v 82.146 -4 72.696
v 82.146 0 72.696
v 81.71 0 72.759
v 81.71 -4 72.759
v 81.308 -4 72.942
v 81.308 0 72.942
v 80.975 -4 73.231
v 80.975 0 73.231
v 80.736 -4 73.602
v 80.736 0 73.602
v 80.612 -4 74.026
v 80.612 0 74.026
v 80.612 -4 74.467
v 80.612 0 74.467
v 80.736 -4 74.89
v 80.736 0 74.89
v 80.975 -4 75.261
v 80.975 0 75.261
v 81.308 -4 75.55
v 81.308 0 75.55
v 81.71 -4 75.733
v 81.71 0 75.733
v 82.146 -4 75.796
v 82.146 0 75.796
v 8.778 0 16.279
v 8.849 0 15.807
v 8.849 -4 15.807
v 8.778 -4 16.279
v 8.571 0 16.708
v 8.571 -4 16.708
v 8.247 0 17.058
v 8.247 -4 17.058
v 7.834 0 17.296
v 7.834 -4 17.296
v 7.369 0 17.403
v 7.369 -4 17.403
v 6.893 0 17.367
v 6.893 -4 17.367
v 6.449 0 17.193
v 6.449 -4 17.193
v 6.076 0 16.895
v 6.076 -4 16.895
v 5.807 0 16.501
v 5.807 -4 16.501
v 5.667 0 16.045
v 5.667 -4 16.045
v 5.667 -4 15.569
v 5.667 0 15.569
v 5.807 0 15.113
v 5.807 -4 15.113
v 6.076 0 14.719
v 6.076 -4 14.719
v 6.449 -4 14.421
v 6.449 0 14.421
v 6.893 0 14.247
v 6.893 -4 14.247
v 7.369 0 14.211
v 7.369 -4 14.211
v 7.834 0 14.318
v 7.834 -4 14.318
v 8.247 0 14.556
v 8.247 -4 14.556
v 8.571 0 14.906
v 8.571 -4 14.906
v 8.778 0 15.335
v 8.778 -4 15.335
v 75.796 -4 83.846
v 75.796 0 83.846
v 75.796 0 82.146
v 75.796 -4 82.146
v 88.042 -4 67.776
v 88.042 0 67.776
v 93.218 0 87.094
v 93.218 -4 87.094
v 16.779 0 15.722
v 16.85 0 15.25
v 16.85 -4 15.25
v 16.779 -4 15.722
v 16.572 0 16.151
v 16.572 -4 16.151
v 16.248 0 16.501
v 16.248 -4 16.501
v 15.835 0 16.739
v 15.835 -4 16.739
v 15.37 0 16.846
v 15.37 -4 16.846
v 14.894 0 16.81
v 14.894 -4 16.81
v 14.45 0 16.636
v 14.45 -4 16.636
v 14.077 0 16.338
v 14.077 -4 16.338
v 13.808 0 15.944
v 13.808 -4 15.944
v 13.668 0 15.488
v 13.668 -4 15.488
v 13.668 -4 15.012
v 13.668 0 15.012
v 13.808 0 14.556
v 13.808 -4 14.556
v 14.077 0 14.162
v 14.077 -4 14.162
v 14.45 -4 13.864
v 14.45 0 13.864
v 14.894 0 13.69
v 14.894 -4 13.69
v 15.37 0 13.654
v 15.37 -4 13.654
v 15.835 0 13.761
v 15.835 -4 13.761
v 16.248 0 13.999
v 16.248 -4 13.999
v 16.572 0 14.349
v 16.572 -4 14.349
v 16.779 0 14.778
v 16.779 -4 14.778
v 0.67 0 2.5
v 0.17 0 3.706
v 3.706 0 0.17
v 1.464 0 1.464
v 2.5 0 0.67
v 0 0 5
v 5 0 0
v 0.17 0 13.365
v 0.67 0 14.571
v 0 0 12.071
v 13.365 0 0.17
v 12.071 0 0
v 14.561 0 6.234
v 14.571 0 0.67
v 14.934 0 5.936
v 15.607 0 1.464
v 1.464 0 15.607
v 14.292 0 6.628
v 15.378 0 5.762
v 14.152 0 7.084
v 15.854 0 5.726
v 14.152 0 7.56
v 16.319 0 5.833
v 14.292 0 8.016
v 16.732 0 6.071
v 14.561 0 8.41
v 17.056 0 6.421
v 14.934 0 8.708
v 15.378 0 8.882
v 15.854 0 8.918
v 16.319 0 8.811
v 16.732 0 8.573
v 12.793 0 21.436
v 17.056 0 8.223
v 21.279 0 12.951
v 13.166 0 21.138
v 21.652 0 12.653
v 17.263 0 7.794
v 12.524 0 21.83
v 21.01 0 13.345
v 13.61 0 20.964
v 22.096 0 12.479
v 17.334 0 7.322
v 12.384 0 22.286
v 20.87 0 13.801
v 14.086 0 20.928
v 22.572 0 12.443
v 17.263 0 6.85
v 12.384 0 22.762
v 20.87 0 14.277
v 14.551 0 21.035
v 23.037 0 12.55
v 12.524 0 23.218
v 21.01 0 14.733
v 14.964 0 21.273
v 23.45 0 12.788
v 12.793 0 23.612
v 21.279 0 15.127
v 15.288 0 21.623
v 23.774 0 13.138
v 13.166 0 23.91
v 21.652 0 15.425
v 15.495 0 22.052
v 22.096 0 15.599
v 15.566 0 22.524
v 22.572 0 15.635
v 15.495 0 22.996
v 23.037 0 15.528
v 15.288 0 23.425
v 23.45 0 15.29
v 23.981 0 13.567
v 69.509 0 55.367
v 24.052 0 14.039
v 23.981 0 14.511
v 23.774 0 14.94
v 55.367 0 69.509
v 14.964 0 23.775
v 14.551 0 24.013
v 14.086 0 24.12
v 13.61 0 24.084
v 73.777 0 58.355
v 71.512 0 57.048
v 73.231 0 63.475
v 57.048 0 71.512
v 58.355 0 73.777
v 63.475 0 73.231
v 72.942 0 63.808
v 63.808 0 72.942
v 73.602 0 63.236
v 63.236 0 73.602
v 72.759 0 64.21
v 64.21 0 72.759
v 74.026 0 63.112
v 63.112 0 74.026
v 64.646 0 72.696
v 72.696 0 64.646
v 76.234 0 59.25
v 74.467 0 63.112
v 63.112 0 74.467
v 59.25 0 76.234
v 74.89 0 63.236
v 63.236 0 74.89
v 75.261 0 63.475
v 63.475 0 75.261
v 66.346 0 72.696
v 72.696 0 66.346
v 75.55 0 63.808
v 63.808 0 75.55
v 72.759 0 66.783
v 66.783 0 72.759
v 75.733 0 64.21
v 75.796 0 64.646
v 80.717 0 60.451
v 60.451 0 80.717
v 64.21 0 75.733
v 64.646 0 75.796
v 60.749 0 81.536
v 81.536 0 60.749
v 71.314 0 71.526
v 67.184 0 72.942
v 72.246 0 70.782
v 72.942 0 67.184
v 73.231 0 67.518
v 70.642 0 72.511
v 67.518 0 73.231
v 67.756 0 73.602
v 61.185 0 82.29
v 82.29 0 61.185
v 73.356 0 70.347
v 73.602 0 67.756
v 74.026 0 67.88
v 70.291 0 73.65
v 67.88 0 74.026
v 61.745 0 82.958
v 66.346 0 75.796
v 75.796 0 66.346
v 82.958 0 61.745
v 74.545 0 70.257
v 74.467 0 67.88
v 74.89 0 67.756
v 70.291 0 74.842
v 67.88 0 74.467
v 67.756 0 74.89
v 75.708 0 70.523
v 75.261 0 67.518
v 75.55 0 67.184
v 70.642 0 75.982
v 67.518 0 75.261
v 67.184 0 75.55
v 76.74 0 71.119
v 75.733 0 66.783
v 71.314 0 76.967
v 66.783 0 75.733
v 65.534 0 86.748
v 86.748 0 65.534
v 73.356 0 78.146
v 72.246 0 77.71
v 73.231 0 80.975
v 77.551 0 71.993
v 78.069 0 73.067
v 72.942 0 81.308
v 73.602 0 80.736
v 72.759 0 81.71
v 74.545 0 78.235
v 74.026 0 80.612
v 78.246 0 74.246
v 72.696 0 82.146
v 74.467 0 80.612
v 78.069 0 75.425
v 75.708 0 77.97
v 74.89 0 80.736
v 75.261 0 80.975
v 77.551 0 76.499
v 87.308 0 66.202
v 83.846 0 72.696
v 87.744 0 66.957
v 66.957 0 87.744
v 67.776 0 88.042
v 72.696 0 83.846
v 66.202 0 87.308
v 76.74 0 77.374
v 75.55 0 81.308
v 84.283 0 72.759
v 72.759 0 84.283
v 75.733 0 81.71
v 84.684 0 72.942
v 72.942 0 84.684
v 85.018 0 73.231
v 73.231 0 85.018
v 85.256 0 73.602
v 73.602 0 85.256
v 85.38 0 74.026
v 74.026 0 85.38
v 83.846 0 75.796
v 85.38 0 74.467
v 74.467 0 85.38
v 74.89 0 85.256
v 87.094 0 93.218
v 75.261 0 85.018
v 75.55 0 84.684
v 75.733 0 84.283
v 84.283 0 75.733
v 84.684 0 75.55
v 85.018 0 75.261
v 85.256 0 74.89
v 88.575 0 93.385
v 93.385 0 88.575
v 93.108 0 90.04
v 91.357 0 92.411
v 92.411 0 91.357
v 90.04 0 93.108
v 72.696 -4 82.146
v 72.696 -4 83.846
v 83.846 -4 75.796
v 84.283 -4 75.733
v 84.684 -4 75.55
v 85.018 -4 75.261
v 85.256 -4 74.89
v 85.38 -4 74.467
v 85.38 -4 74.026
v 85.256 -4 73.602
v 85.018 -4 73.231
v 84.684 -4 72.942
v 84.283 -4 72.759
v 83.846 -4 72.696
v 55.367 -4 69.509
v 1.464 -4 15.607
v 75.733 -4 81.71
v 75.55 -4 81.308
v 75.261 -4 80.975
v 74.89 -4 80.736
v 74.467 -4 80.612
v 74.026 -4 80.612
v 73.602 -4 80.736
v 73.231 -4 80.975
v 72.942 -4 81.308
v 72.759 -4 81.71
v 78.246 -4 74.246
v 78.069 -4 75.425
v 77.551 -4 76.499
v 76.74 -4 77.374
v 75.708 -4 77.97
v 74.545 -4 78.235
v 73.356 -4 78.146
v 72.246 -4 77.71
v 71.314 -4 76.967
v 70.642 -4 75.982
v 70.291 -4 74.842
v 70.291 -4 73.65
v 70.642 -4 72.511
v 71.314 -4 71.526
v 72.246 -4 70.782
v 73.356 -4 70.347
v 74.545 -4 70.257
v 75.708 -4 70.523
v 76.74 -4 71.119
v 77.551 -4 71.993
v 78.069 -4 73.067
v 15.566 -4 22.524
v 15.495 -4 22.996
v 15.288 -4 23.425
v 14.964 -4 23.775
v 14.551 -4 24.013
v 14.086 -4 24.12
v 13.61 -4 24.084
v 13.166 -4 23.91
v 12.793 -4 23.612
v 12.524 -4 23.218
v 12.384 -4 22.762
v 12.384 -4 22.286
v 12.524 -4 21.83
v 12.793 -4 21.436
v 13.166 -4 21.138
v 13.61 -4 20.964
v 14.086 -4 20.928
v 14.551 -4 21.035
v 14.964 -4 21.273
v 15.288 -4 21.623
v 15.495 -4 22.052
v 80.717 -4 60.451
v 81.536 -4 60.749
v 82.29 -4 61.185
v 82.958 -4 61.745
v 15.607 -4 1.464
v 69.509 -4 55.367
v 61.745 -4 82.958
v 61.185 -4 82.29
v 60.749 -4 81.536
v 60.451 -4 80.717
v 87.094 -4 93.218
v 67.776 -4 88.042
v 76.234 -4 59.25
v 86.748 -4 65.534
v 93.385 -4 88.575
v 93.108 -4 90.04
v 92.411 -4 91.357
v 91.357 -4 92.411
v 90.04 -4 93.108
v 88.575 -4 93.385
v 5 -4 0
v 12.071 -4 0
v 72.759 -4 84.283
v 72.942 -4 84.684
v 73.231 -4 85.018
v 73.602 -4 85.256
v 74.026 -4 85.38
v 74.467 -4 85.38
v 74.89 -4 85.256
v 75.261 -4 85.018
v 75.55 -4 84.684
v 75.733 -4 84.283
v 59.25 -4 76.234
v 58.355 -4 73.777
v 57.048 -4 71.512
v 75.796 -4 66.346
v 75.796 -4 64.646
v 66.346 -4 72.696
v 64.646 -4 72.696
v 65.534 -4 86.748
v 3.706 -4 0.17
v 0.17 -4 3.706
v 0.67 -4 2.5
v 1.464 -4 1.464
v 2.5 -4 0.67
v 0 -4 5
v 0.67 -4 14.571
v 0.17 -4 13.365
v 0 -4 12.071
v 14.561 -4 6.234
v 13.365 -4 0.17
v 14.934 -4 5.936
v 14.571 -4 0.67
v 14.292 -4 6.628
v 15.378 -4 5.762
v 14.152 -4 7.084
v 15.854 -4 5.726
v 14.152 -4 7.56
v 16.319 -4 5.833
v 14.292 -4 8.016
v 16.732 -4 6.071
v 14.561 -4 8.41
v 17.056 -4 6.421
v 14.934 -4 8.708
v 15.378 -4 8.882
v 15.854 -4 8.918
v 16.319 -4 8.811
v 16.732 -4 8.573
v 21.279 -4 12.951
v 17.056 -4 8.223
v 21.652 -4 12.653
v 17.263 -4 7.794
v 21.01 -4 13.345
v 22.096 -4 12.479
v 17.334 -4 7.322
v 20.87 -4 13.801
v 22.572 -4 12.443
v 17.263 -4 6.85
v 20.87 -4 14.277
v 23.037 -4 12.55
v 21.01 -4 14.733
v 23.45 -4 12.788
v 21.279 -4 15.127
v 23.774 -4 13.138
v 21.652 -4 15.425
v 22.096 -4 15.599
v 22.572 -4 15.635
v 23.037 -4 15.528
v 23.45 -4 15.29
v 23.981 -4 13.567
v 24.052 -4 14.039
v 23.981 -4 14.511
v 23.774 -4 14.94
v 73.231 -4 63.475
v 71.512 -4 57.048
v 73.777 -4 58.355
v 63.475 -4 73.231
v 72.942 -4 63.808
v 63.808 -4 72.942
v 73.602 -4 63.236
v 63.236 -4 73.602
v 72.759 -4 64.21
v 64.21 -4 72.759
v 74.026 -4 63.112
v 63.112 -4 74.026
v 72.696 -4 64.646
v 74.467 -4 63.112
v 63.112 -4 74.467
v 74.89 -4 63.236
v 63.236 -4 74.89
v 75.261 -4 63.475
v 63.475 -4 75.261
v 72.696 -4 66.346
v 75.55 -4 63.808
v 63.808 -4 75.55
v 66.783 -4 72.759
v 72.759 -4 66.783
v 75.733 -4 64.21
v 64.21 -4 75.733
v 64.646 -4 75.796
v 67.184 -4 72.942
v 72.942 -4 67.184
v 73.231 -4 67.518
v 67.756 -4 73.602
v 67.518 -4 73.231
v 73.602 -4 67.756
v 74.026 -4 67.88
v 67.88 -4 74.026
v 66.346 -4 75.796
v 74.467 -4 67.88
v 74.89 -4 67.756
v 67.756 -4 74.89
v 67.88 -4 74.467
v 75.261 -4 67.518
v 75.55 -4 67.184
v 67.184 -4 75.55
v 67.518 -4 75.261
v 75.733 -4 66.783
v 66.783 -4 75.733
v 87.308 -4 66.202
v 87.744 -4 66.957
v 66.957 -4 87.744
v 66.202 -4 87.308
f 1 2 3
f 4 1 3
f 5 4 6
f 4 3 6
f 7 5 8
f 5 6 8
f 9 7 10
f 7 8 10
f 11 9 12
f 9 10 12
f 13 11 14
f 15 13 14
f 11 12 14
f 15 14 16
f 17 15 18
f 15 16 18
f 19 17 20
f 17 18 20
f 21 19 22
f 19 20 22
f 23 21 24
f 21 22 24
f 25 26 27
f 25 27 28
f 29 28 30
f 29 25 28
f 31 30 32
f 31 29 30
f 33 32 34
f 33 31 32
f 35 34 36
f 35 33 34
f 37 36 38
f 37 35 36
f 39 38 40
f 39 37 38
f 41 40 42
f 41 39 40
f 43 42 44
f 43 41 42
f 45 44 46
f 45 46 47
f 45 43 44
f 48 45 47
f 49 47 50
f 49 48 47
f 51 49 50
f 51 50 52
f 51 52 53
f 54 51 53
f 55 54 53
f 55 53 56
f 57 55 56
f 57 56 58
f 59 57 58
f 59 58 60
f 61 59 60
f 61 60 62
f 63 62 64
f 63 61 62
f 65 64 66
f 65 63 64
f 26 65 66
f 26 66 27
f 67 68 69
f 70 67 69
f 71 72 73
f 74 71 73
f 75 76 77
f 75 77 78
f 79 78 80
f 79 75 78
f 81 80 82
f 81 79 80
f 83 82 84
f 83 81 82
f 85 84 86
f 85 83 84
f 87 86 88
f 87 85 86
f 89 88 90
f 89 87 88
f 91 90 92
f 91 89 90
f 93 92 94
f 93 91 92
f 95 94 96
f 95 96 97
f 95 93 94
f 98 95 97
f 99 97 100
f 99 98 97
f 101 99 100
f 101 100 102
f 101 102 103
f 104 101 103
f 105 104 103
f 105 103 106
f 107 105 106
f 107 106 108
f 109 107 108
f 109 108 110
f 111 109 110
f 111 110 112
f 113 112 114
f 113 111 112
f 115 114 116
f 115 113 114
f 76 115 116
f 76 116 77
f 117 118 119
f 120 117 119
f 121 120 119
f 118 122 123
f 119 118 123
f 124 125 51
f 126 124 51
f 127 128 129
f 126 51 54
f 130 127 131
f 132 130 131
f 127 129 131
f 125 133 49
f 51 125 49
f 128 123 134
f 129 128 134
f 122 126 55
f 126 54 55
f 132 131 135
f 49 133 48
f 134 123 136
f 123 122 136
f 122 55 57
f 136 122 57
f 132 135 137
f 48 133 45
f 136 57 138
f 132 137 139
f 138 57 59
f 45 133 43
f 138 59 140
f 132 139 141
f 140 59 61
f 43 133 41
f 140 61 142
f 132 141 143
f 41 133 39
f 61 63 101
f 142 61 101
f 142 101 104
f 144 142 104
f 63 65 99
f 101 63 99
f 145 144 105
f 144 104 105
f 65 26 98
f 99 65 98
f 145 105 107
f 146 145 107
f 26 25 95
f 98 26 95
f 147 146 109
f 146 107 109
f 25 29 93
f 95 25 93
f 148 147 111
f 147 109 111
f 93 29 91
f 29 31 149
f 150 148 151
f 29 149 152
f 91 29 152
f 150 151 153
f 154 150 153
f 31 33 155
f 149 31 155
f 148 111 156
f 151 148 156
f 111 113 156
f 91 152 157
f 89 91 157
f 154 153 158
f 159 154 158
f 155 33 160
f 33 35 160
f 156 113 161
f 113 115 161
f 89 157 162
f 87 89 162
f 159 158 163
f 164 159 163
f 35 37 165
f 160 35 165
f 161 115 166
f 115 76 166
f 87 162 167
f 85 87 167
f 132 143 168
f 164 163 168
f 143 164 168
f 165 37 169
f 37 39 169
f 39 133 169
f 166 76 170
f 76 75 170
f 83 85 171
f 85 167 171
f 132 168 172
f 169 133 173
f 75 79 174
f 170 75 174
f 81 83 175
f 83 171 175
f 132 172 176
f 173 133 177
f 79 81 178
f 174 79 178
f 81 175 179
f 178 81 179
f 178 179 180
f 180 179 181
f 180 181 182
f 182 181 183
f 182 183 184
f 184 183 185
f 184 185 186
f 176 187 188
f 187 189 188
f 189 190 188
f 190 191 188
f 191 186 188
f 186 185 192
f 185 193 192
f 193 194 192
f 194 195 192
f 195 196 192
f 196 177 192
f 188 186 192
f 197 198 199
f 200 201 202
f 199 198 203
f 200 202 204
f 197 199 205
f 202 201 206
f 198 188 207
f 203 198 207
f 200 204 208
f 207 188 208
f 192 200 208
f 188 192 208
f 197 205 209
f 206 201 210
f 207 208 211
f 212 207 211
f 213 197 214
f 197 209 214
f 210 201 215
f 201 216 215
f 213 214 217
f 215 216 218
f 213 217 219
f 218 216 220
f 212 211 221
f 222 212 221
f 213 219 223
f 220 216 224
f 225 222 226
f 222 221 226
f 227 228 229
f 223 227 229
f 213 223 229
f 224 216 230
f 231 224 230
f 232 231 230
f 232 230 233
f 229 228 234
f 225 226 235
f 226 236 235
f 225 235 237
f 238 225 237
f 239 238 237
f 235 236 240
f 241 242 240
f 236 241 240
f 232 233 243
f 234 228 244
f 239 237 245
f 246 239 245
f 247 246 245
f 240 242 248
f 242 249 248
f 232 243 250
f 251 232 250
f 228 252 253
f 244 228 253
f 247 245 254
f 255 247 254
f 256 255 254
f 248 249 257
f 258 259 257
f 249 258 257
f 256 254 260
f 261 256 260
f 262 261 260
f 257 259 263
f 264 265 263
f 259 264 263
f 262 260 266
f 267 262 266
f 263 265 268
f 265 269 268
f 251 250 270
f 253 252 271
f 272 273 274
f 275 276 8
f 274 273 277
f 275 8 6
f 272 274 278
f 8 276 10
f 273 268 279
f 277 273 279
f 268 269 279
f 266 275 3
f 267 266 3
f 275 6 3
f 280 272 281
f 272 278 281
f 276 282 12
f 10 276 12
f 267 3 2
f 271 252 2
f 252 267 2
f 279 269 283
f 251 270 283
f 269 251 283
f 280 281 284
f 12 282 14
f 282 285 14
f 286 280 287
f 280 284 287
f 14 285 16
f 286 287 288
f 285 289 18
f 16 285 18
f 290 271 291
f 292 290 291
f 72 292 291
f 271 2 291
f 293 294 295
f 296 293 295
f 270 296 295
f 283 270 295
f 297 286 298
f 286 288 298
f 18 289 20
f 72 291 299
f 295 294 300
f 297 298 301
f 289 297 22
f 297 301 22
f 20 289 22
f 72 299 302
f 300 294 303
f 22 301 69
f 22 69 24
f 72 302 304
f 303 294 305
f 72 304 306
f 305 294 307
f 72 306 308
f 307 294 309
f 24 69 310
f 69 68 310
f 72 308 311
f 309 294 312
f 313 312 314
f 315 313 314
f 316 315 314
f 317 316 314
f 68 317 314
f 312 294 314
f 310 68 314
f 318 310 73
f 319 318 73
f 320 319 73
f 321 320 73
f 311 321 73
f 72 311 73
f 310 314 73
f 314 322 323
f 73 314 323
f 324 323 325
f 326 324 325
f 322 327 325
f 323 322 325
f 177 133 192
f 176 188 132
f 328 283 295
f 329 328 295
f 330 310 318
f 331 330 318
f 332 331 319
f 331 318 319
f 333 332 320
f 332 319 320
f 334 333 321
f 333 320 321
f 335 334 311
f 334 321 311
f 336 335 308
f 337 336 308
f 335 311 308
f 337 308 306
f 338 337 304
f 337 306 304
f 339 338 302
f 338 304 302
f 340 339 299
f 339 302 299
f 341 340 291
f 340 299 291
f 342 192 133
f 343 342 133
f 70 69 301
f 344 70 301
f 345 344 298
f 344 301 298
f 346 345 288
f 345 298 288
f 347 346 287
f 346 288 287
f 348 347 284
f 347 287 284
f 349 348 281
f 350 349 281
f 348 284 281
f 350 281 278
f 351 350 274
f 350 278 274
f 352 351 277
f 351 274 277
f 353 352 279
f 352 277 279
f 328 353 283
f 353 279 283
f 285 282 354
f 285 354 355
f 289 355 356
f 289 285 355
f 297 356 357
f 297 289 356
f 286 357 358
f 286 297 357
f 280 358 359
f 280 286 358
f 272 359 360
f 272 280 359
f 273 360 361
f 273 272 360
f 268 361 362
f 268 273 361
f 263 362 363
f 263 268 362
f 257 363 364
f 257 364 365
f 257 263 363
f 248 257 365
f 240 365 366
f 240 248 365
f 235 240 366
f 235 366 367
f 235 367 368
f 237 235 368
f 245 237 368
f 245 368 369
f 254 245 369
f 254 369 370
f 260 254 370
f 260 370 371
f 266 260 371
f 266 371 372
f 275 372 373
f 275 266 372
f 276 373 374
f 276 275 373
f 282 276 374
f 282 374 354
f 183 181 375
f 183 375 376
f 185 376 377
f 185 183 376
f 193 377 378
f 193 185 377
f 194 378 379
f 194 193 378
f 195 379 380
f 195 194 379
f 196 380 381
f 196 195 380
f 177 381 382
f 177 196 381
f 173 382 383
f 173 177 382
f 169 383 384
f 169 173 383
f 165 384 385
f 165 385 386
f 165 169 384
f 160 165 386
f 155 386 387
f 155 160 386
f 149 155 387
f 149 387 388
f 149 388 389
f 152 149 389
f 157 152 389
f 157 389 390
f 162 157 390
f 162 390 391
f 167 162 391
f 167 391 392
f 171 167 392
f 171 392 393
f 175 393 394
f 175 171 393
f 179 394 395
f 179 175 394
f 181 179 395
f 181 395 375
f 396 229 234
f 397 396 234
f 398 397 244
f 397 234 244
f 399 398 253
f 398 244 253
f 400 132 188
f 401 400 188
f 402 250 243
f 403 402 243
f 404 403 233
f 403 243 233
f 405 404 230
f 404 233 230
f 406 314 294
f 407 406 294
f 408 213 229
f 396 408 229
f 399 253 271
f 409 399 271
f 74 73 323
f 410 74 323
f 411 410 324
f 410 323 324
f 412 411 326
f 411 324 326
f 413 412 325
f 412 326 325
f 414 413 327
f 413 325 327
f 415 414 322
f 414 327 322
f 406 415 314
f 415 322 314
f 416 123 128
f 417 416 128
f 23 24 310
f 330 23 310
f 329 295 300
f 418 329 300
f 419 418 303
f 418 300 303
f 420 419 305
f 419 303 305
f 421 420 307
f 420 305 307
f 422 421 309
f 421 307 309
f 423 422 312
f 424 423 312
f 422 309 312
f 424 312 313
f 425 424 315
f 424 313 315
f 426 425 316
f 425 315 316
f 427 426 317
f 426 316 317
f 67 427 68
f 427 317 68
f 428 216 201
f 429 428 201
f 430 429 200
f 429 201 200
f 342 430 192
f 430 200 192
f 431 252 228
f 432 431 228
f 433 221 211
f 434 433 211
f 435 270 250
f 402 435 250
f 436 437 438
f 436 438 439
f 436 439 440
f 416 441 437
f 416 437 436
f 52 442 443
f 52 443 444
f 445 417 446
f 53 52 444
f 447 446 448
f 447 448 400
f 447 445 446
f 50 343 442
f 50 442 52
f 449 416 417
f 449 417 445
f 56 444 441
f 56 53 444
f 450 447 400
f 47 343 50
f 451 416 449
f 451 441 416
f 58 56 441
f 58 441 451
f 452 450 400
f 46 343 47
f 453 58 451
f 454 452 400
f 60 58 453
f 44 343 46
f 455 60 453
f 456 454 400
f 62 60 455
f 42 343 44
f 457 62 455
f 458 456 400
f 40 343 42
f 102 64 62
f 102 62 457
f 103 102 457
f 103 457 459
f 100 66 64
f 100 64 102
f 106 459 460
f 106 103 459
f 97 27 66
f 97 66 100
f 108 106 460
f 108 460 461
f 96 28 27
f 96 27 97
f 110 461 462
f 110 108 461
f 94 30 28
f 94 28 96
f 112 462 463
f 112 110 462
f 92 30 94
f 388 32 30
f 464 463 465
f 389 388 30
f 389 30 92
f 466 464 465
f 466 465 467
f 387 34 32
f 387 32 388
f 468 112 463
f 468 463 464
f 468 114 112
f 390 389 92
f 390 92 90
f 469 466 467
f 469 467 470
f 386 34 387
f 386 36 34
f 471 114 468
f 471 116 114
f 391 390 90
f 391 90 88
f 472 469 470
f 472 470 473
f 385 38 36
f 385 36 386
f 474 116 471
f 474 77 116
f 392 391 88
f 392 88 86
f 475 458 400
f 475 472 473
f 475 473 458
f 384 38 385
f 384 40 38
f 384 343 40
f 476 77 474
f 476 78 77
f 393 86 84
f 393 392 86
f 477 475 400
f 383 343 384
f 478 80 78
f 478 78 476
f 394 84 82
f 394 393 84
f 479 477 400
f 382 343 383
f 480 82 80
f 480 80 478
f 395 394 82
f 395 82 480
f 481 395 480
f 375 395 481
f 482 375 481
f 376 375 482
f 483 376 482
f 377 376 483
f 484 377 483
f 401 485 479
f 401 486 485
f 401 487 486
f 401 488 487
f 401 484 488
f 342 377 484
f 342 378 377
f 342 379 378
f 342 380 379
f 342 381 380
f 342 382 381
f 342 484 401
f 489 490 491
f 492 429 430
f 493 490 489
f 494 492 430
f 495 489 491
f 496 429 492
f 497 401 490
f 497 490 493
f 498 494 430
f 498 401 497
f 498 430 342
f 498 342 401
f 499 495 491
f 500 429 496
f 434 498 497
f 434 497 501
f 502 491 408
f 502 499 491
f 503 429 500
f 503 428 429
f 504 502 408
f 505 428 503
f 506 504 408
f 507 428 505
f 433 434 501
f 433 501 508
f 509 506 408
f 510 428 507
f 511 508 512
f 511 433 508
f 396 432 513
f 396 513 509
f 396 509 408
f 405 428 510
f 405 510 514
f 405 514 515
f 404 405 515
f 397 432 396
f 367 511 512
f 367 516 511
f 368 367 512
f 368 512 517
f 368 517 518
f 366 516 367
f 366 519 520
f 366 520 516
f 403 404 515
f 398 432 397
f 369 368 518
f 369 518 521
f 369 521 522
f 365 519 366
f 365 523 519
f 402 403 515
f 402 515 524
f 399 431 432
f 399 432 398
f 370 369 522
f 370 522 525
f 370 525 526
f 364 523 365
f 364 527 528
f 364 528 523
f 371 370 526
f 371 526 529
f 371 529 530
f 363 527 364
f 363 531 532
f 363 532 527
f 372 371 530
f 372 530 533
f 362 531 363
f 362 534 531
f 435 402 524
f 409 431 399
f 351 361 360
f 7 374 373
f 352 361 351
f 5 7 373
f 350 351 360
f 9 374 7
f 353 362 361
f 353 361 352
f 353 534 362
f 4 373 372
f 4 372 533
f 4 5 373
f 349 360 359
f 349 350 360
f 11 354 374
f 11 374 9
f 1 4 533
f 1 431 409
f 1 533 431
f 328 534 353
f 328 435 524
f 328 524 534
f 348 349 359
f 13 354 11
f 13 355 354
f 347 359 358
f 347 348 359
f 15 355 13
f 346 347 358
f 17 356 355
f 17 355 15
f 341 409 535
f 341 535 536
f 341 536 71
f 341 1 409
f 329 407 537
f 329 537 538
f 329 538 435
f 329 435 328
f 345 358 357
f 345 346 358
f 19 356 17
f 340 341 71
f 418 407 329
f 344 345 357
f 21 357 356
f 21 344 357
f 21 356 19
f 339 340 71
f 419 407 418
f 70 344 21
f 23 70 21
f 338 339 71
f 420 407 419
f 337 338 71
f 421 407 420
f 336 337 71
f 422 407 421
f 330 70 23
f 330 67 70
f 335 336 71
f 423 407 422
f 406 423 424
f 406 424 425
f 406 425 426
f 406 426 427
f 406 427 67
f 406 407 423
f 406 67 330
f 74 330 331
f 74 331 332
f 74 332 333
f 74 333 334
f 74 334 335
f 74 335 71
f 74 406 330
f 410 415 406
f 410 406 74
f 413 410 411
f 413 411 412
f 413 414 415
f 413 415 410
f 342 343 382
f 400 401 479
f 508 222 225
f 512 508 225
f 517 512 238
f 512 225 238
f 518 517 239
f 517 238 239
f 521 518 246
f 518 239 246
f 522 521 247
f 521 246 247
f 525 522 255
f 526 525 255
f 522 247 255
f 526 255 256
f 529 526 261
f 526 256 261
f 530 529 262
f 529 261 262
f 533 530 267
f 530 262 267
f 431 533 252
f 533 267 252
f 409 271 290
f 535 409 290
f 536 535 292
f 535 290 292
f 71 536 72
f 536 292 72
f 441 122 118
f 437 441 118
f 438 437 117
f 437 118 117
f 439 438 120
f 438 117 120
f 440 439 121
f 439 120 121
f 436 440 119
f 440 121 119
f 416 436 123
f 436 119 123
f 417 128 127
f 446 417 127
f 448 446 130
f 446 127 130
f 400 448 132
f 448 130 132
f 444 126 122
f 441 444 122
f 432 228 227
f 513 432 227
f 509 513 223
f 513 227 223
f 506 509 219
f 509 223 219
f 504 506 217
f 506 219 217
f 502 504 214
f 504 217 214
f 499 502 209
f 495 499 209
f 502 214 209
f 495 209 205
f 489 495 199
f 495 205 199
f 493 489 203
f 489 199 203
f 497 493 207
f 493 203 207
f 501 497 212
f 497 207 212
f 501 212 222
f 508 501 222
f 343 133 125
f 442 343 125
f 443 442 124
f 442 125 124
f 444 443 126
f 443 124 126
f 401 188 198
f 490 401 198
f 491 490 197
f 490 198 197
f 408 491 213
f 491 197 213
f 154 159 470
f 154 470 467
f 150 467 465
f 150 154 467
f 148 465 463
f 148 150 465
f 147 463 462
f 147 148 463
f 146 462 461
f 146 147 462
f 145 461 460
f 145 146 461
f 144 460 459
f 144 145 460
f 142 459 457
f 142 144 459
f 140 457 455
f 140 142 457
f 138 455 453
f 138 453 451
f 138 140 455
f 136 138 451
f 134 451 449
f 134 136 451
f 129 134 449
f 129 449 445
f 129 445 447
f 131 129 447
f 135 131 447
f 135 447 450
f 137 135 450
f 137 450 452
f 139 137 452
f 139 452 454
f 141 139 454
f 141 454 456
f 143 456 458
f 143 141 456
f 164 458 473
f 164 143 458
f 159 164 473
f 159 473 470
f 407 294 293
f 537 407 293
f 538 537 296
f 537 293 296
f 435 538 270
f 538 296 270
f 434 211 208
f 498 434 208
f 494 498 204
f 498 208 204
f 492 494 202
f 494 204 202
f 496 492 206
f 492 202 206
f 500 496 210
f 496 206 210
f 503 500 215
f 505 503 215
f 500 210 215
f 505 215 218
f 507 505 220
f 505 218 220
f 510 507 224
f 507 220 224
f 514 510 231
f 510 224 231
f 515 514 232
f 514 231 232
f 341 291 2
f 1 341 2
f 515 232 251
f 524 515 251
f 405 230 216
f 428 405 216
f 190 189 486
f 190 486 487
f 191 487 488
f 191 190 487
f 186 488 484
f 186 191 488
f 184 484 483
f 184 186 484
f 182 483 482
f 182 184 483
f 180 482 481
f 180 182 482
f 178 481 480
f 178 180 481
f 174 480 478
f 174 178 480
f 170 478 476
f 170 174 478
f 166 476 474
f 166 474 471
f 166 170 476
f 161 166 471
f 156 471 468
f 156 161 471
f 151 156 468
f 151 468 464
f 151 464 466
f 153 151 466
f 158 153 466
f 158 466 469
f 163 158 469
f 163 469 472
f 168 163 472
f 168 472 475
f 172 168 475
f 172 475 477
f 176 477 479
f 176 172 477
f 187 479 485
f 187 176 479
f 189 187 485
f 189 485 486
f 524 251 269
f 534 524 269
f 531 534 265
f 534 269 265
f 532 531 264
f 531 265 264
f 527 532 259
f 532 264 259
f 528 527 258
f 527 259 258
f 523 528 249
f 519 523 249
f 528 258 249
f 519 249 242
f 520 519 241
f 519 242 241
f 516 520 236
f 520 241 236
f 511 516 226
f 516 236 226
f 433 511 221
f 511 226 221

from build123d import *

# Parameters (mm, degrees)
F0_R     = 1.6
F0_R_2   = 4
F1_DEPTH = 4


with BuildPart() as f1:
    # F0 (on Front) → F1 (new body)
    with BuildSketch(Plane.XZ):
        with BuildLine():
            Line((55.367359, 69.509495), (1.464466, 15.606602))
            ThreePointArc((1.464466, 15.606602), (0.380602, 13.984485), (0, 12.071068))
            Line((0, 12.071068), (0, 5))
            ThreePointArc((0, 5), (1.464466, 1.464466), (5, 0))
            Line((5, 0), (12.071068, 0))
            ThreePointArc((12.071068, 0), (13.984485, 0.380602), (15.606602, 1.464466))
            Line((15.606602, 1.464466), (69.509495, 55.367359))
            ThreePointArc((69.509495, 55.367359), (72.616096, 57.751138), (76.233811, 59.249645))
            Line((76.233811, 59.249645), (80.716688, 60.450828))
            ThreePointArc((80.716688, 60.450828), (81.922593, 60.95033), (82.958127, 61.744923))
            Line((82.958127, 61.744923), (86.747501, 65.534297))
            ThreePointArc((86.747501, 65.534297), (87.542094, 66.569831), (88.041596, 67.775736))
            Line((88.041596, 67.775736), (93.217977, 87.094252))
            ThreePointArc((93.217977, 87.094252), (91.923882, 91.923882), (87.094252, 93.217977))
            Line((87.094252, 93.217977), (67.775736, 88.041596))
            ThreePointArc((67.775736, 88.041596), (66.569831, 87.542094), (65.534297, 86.747501))
            Line((65.534297, 86.747501), (61.744923, 82.958127))
            ThreePointArc((61.744923, 82.958127), (60.95033, 81.922593), (60.450828, 80.716688))
            Line((60.450828, 80.716688), (59.249645, 76.233811))
            ThreePointArc((59.249645, 76.233811), (57.751138, 72.616096), (55.367359, 69.509495))
        make_face()
        with Locations((15.734, 7.322)):
            Circle(F0_R, mode=Mode.SUBTRACT)
        with Locations((7.249, 15.807)):
            Circle(F0_R, mode=Mode.SUBTRACT)
        with Locations((15.25, 15.25)):
            Circle(F0_R, mode=Mode.SUBTRACT)
        with Locations((22.452, 14.039)):
            Circle(F0_R, mode=Mode.SUBTRACT)
        with Locations((13.966, 22.524)):
            Circle(F0_R, mode=Mode.SUBTRACT)
        with BuildLine():
            ThreePointArc((75.796212, 64.646212), (74.246212, 63.096212), (72.696212, 64.646212))
            Line((72.696212, 64.646212), (72.696212, 66.346212))
            ThreePointArc((72.696212, 66.346212), (74.246212, 67.896212), (75.796212, 66.346212))
            Line((75.796212, 66.346212), (75.796212, 64.646212))
        make_face(mode=Mode.SUBTRACT)
        with BuildLine():
            ThreePointArc((64.646212, 72.696212), (63.096212, 74.246212), (64.646212, 75.796212))
            Line((64.646212, 75.796212), (66.346212, 75.796212))
            ThreePointArc((66.346212, 75.796212), (67.896212, 74.246212), (66.346212, 72.696212))
            Line((66.346212, 72.696212), (64.646212, 72.696212))
        make_face(mode=Mode.SUBTRACT)
        with Locations((74.246212, 74.246212)):
            Circle(F0_R_2, mode=Mode.SUBTRACT)
        with BuildLine():
            ThreePointArc((83.846212, 75.796212), (85.396212, 74.246212), (83.846212, 72.696212))
            Line((83.846212, 72.696212), (82.146212, 72.696212))
            ThreePointArc((82.146212, 72.696212), (80.596212, 74.246212), (82.146212, 75.796212))
            Line((82.146212, 75.796212), (83.846212, 75.796212))
        make_face(mode=Mode.SUBTRACT)
        with BuildLine():
            ThreePointArc((72.696212, 83.846212), (74.246212, 85.396212), (75.796212, 83.846212))
            Line((75.796212, 83.846212), (75.796212, 82.146212))
            ThreePointArc((75.796212, 82.146212), (74.246212, 80.596212), (72.696212, 82.146212))
            Line((72.696212, 82.146212), (72.696212, 83.846212))
        make_face(mode=Mode.SUBTRACT)
    extrude(amount=F1_DEPTH)


solid = f1.part
